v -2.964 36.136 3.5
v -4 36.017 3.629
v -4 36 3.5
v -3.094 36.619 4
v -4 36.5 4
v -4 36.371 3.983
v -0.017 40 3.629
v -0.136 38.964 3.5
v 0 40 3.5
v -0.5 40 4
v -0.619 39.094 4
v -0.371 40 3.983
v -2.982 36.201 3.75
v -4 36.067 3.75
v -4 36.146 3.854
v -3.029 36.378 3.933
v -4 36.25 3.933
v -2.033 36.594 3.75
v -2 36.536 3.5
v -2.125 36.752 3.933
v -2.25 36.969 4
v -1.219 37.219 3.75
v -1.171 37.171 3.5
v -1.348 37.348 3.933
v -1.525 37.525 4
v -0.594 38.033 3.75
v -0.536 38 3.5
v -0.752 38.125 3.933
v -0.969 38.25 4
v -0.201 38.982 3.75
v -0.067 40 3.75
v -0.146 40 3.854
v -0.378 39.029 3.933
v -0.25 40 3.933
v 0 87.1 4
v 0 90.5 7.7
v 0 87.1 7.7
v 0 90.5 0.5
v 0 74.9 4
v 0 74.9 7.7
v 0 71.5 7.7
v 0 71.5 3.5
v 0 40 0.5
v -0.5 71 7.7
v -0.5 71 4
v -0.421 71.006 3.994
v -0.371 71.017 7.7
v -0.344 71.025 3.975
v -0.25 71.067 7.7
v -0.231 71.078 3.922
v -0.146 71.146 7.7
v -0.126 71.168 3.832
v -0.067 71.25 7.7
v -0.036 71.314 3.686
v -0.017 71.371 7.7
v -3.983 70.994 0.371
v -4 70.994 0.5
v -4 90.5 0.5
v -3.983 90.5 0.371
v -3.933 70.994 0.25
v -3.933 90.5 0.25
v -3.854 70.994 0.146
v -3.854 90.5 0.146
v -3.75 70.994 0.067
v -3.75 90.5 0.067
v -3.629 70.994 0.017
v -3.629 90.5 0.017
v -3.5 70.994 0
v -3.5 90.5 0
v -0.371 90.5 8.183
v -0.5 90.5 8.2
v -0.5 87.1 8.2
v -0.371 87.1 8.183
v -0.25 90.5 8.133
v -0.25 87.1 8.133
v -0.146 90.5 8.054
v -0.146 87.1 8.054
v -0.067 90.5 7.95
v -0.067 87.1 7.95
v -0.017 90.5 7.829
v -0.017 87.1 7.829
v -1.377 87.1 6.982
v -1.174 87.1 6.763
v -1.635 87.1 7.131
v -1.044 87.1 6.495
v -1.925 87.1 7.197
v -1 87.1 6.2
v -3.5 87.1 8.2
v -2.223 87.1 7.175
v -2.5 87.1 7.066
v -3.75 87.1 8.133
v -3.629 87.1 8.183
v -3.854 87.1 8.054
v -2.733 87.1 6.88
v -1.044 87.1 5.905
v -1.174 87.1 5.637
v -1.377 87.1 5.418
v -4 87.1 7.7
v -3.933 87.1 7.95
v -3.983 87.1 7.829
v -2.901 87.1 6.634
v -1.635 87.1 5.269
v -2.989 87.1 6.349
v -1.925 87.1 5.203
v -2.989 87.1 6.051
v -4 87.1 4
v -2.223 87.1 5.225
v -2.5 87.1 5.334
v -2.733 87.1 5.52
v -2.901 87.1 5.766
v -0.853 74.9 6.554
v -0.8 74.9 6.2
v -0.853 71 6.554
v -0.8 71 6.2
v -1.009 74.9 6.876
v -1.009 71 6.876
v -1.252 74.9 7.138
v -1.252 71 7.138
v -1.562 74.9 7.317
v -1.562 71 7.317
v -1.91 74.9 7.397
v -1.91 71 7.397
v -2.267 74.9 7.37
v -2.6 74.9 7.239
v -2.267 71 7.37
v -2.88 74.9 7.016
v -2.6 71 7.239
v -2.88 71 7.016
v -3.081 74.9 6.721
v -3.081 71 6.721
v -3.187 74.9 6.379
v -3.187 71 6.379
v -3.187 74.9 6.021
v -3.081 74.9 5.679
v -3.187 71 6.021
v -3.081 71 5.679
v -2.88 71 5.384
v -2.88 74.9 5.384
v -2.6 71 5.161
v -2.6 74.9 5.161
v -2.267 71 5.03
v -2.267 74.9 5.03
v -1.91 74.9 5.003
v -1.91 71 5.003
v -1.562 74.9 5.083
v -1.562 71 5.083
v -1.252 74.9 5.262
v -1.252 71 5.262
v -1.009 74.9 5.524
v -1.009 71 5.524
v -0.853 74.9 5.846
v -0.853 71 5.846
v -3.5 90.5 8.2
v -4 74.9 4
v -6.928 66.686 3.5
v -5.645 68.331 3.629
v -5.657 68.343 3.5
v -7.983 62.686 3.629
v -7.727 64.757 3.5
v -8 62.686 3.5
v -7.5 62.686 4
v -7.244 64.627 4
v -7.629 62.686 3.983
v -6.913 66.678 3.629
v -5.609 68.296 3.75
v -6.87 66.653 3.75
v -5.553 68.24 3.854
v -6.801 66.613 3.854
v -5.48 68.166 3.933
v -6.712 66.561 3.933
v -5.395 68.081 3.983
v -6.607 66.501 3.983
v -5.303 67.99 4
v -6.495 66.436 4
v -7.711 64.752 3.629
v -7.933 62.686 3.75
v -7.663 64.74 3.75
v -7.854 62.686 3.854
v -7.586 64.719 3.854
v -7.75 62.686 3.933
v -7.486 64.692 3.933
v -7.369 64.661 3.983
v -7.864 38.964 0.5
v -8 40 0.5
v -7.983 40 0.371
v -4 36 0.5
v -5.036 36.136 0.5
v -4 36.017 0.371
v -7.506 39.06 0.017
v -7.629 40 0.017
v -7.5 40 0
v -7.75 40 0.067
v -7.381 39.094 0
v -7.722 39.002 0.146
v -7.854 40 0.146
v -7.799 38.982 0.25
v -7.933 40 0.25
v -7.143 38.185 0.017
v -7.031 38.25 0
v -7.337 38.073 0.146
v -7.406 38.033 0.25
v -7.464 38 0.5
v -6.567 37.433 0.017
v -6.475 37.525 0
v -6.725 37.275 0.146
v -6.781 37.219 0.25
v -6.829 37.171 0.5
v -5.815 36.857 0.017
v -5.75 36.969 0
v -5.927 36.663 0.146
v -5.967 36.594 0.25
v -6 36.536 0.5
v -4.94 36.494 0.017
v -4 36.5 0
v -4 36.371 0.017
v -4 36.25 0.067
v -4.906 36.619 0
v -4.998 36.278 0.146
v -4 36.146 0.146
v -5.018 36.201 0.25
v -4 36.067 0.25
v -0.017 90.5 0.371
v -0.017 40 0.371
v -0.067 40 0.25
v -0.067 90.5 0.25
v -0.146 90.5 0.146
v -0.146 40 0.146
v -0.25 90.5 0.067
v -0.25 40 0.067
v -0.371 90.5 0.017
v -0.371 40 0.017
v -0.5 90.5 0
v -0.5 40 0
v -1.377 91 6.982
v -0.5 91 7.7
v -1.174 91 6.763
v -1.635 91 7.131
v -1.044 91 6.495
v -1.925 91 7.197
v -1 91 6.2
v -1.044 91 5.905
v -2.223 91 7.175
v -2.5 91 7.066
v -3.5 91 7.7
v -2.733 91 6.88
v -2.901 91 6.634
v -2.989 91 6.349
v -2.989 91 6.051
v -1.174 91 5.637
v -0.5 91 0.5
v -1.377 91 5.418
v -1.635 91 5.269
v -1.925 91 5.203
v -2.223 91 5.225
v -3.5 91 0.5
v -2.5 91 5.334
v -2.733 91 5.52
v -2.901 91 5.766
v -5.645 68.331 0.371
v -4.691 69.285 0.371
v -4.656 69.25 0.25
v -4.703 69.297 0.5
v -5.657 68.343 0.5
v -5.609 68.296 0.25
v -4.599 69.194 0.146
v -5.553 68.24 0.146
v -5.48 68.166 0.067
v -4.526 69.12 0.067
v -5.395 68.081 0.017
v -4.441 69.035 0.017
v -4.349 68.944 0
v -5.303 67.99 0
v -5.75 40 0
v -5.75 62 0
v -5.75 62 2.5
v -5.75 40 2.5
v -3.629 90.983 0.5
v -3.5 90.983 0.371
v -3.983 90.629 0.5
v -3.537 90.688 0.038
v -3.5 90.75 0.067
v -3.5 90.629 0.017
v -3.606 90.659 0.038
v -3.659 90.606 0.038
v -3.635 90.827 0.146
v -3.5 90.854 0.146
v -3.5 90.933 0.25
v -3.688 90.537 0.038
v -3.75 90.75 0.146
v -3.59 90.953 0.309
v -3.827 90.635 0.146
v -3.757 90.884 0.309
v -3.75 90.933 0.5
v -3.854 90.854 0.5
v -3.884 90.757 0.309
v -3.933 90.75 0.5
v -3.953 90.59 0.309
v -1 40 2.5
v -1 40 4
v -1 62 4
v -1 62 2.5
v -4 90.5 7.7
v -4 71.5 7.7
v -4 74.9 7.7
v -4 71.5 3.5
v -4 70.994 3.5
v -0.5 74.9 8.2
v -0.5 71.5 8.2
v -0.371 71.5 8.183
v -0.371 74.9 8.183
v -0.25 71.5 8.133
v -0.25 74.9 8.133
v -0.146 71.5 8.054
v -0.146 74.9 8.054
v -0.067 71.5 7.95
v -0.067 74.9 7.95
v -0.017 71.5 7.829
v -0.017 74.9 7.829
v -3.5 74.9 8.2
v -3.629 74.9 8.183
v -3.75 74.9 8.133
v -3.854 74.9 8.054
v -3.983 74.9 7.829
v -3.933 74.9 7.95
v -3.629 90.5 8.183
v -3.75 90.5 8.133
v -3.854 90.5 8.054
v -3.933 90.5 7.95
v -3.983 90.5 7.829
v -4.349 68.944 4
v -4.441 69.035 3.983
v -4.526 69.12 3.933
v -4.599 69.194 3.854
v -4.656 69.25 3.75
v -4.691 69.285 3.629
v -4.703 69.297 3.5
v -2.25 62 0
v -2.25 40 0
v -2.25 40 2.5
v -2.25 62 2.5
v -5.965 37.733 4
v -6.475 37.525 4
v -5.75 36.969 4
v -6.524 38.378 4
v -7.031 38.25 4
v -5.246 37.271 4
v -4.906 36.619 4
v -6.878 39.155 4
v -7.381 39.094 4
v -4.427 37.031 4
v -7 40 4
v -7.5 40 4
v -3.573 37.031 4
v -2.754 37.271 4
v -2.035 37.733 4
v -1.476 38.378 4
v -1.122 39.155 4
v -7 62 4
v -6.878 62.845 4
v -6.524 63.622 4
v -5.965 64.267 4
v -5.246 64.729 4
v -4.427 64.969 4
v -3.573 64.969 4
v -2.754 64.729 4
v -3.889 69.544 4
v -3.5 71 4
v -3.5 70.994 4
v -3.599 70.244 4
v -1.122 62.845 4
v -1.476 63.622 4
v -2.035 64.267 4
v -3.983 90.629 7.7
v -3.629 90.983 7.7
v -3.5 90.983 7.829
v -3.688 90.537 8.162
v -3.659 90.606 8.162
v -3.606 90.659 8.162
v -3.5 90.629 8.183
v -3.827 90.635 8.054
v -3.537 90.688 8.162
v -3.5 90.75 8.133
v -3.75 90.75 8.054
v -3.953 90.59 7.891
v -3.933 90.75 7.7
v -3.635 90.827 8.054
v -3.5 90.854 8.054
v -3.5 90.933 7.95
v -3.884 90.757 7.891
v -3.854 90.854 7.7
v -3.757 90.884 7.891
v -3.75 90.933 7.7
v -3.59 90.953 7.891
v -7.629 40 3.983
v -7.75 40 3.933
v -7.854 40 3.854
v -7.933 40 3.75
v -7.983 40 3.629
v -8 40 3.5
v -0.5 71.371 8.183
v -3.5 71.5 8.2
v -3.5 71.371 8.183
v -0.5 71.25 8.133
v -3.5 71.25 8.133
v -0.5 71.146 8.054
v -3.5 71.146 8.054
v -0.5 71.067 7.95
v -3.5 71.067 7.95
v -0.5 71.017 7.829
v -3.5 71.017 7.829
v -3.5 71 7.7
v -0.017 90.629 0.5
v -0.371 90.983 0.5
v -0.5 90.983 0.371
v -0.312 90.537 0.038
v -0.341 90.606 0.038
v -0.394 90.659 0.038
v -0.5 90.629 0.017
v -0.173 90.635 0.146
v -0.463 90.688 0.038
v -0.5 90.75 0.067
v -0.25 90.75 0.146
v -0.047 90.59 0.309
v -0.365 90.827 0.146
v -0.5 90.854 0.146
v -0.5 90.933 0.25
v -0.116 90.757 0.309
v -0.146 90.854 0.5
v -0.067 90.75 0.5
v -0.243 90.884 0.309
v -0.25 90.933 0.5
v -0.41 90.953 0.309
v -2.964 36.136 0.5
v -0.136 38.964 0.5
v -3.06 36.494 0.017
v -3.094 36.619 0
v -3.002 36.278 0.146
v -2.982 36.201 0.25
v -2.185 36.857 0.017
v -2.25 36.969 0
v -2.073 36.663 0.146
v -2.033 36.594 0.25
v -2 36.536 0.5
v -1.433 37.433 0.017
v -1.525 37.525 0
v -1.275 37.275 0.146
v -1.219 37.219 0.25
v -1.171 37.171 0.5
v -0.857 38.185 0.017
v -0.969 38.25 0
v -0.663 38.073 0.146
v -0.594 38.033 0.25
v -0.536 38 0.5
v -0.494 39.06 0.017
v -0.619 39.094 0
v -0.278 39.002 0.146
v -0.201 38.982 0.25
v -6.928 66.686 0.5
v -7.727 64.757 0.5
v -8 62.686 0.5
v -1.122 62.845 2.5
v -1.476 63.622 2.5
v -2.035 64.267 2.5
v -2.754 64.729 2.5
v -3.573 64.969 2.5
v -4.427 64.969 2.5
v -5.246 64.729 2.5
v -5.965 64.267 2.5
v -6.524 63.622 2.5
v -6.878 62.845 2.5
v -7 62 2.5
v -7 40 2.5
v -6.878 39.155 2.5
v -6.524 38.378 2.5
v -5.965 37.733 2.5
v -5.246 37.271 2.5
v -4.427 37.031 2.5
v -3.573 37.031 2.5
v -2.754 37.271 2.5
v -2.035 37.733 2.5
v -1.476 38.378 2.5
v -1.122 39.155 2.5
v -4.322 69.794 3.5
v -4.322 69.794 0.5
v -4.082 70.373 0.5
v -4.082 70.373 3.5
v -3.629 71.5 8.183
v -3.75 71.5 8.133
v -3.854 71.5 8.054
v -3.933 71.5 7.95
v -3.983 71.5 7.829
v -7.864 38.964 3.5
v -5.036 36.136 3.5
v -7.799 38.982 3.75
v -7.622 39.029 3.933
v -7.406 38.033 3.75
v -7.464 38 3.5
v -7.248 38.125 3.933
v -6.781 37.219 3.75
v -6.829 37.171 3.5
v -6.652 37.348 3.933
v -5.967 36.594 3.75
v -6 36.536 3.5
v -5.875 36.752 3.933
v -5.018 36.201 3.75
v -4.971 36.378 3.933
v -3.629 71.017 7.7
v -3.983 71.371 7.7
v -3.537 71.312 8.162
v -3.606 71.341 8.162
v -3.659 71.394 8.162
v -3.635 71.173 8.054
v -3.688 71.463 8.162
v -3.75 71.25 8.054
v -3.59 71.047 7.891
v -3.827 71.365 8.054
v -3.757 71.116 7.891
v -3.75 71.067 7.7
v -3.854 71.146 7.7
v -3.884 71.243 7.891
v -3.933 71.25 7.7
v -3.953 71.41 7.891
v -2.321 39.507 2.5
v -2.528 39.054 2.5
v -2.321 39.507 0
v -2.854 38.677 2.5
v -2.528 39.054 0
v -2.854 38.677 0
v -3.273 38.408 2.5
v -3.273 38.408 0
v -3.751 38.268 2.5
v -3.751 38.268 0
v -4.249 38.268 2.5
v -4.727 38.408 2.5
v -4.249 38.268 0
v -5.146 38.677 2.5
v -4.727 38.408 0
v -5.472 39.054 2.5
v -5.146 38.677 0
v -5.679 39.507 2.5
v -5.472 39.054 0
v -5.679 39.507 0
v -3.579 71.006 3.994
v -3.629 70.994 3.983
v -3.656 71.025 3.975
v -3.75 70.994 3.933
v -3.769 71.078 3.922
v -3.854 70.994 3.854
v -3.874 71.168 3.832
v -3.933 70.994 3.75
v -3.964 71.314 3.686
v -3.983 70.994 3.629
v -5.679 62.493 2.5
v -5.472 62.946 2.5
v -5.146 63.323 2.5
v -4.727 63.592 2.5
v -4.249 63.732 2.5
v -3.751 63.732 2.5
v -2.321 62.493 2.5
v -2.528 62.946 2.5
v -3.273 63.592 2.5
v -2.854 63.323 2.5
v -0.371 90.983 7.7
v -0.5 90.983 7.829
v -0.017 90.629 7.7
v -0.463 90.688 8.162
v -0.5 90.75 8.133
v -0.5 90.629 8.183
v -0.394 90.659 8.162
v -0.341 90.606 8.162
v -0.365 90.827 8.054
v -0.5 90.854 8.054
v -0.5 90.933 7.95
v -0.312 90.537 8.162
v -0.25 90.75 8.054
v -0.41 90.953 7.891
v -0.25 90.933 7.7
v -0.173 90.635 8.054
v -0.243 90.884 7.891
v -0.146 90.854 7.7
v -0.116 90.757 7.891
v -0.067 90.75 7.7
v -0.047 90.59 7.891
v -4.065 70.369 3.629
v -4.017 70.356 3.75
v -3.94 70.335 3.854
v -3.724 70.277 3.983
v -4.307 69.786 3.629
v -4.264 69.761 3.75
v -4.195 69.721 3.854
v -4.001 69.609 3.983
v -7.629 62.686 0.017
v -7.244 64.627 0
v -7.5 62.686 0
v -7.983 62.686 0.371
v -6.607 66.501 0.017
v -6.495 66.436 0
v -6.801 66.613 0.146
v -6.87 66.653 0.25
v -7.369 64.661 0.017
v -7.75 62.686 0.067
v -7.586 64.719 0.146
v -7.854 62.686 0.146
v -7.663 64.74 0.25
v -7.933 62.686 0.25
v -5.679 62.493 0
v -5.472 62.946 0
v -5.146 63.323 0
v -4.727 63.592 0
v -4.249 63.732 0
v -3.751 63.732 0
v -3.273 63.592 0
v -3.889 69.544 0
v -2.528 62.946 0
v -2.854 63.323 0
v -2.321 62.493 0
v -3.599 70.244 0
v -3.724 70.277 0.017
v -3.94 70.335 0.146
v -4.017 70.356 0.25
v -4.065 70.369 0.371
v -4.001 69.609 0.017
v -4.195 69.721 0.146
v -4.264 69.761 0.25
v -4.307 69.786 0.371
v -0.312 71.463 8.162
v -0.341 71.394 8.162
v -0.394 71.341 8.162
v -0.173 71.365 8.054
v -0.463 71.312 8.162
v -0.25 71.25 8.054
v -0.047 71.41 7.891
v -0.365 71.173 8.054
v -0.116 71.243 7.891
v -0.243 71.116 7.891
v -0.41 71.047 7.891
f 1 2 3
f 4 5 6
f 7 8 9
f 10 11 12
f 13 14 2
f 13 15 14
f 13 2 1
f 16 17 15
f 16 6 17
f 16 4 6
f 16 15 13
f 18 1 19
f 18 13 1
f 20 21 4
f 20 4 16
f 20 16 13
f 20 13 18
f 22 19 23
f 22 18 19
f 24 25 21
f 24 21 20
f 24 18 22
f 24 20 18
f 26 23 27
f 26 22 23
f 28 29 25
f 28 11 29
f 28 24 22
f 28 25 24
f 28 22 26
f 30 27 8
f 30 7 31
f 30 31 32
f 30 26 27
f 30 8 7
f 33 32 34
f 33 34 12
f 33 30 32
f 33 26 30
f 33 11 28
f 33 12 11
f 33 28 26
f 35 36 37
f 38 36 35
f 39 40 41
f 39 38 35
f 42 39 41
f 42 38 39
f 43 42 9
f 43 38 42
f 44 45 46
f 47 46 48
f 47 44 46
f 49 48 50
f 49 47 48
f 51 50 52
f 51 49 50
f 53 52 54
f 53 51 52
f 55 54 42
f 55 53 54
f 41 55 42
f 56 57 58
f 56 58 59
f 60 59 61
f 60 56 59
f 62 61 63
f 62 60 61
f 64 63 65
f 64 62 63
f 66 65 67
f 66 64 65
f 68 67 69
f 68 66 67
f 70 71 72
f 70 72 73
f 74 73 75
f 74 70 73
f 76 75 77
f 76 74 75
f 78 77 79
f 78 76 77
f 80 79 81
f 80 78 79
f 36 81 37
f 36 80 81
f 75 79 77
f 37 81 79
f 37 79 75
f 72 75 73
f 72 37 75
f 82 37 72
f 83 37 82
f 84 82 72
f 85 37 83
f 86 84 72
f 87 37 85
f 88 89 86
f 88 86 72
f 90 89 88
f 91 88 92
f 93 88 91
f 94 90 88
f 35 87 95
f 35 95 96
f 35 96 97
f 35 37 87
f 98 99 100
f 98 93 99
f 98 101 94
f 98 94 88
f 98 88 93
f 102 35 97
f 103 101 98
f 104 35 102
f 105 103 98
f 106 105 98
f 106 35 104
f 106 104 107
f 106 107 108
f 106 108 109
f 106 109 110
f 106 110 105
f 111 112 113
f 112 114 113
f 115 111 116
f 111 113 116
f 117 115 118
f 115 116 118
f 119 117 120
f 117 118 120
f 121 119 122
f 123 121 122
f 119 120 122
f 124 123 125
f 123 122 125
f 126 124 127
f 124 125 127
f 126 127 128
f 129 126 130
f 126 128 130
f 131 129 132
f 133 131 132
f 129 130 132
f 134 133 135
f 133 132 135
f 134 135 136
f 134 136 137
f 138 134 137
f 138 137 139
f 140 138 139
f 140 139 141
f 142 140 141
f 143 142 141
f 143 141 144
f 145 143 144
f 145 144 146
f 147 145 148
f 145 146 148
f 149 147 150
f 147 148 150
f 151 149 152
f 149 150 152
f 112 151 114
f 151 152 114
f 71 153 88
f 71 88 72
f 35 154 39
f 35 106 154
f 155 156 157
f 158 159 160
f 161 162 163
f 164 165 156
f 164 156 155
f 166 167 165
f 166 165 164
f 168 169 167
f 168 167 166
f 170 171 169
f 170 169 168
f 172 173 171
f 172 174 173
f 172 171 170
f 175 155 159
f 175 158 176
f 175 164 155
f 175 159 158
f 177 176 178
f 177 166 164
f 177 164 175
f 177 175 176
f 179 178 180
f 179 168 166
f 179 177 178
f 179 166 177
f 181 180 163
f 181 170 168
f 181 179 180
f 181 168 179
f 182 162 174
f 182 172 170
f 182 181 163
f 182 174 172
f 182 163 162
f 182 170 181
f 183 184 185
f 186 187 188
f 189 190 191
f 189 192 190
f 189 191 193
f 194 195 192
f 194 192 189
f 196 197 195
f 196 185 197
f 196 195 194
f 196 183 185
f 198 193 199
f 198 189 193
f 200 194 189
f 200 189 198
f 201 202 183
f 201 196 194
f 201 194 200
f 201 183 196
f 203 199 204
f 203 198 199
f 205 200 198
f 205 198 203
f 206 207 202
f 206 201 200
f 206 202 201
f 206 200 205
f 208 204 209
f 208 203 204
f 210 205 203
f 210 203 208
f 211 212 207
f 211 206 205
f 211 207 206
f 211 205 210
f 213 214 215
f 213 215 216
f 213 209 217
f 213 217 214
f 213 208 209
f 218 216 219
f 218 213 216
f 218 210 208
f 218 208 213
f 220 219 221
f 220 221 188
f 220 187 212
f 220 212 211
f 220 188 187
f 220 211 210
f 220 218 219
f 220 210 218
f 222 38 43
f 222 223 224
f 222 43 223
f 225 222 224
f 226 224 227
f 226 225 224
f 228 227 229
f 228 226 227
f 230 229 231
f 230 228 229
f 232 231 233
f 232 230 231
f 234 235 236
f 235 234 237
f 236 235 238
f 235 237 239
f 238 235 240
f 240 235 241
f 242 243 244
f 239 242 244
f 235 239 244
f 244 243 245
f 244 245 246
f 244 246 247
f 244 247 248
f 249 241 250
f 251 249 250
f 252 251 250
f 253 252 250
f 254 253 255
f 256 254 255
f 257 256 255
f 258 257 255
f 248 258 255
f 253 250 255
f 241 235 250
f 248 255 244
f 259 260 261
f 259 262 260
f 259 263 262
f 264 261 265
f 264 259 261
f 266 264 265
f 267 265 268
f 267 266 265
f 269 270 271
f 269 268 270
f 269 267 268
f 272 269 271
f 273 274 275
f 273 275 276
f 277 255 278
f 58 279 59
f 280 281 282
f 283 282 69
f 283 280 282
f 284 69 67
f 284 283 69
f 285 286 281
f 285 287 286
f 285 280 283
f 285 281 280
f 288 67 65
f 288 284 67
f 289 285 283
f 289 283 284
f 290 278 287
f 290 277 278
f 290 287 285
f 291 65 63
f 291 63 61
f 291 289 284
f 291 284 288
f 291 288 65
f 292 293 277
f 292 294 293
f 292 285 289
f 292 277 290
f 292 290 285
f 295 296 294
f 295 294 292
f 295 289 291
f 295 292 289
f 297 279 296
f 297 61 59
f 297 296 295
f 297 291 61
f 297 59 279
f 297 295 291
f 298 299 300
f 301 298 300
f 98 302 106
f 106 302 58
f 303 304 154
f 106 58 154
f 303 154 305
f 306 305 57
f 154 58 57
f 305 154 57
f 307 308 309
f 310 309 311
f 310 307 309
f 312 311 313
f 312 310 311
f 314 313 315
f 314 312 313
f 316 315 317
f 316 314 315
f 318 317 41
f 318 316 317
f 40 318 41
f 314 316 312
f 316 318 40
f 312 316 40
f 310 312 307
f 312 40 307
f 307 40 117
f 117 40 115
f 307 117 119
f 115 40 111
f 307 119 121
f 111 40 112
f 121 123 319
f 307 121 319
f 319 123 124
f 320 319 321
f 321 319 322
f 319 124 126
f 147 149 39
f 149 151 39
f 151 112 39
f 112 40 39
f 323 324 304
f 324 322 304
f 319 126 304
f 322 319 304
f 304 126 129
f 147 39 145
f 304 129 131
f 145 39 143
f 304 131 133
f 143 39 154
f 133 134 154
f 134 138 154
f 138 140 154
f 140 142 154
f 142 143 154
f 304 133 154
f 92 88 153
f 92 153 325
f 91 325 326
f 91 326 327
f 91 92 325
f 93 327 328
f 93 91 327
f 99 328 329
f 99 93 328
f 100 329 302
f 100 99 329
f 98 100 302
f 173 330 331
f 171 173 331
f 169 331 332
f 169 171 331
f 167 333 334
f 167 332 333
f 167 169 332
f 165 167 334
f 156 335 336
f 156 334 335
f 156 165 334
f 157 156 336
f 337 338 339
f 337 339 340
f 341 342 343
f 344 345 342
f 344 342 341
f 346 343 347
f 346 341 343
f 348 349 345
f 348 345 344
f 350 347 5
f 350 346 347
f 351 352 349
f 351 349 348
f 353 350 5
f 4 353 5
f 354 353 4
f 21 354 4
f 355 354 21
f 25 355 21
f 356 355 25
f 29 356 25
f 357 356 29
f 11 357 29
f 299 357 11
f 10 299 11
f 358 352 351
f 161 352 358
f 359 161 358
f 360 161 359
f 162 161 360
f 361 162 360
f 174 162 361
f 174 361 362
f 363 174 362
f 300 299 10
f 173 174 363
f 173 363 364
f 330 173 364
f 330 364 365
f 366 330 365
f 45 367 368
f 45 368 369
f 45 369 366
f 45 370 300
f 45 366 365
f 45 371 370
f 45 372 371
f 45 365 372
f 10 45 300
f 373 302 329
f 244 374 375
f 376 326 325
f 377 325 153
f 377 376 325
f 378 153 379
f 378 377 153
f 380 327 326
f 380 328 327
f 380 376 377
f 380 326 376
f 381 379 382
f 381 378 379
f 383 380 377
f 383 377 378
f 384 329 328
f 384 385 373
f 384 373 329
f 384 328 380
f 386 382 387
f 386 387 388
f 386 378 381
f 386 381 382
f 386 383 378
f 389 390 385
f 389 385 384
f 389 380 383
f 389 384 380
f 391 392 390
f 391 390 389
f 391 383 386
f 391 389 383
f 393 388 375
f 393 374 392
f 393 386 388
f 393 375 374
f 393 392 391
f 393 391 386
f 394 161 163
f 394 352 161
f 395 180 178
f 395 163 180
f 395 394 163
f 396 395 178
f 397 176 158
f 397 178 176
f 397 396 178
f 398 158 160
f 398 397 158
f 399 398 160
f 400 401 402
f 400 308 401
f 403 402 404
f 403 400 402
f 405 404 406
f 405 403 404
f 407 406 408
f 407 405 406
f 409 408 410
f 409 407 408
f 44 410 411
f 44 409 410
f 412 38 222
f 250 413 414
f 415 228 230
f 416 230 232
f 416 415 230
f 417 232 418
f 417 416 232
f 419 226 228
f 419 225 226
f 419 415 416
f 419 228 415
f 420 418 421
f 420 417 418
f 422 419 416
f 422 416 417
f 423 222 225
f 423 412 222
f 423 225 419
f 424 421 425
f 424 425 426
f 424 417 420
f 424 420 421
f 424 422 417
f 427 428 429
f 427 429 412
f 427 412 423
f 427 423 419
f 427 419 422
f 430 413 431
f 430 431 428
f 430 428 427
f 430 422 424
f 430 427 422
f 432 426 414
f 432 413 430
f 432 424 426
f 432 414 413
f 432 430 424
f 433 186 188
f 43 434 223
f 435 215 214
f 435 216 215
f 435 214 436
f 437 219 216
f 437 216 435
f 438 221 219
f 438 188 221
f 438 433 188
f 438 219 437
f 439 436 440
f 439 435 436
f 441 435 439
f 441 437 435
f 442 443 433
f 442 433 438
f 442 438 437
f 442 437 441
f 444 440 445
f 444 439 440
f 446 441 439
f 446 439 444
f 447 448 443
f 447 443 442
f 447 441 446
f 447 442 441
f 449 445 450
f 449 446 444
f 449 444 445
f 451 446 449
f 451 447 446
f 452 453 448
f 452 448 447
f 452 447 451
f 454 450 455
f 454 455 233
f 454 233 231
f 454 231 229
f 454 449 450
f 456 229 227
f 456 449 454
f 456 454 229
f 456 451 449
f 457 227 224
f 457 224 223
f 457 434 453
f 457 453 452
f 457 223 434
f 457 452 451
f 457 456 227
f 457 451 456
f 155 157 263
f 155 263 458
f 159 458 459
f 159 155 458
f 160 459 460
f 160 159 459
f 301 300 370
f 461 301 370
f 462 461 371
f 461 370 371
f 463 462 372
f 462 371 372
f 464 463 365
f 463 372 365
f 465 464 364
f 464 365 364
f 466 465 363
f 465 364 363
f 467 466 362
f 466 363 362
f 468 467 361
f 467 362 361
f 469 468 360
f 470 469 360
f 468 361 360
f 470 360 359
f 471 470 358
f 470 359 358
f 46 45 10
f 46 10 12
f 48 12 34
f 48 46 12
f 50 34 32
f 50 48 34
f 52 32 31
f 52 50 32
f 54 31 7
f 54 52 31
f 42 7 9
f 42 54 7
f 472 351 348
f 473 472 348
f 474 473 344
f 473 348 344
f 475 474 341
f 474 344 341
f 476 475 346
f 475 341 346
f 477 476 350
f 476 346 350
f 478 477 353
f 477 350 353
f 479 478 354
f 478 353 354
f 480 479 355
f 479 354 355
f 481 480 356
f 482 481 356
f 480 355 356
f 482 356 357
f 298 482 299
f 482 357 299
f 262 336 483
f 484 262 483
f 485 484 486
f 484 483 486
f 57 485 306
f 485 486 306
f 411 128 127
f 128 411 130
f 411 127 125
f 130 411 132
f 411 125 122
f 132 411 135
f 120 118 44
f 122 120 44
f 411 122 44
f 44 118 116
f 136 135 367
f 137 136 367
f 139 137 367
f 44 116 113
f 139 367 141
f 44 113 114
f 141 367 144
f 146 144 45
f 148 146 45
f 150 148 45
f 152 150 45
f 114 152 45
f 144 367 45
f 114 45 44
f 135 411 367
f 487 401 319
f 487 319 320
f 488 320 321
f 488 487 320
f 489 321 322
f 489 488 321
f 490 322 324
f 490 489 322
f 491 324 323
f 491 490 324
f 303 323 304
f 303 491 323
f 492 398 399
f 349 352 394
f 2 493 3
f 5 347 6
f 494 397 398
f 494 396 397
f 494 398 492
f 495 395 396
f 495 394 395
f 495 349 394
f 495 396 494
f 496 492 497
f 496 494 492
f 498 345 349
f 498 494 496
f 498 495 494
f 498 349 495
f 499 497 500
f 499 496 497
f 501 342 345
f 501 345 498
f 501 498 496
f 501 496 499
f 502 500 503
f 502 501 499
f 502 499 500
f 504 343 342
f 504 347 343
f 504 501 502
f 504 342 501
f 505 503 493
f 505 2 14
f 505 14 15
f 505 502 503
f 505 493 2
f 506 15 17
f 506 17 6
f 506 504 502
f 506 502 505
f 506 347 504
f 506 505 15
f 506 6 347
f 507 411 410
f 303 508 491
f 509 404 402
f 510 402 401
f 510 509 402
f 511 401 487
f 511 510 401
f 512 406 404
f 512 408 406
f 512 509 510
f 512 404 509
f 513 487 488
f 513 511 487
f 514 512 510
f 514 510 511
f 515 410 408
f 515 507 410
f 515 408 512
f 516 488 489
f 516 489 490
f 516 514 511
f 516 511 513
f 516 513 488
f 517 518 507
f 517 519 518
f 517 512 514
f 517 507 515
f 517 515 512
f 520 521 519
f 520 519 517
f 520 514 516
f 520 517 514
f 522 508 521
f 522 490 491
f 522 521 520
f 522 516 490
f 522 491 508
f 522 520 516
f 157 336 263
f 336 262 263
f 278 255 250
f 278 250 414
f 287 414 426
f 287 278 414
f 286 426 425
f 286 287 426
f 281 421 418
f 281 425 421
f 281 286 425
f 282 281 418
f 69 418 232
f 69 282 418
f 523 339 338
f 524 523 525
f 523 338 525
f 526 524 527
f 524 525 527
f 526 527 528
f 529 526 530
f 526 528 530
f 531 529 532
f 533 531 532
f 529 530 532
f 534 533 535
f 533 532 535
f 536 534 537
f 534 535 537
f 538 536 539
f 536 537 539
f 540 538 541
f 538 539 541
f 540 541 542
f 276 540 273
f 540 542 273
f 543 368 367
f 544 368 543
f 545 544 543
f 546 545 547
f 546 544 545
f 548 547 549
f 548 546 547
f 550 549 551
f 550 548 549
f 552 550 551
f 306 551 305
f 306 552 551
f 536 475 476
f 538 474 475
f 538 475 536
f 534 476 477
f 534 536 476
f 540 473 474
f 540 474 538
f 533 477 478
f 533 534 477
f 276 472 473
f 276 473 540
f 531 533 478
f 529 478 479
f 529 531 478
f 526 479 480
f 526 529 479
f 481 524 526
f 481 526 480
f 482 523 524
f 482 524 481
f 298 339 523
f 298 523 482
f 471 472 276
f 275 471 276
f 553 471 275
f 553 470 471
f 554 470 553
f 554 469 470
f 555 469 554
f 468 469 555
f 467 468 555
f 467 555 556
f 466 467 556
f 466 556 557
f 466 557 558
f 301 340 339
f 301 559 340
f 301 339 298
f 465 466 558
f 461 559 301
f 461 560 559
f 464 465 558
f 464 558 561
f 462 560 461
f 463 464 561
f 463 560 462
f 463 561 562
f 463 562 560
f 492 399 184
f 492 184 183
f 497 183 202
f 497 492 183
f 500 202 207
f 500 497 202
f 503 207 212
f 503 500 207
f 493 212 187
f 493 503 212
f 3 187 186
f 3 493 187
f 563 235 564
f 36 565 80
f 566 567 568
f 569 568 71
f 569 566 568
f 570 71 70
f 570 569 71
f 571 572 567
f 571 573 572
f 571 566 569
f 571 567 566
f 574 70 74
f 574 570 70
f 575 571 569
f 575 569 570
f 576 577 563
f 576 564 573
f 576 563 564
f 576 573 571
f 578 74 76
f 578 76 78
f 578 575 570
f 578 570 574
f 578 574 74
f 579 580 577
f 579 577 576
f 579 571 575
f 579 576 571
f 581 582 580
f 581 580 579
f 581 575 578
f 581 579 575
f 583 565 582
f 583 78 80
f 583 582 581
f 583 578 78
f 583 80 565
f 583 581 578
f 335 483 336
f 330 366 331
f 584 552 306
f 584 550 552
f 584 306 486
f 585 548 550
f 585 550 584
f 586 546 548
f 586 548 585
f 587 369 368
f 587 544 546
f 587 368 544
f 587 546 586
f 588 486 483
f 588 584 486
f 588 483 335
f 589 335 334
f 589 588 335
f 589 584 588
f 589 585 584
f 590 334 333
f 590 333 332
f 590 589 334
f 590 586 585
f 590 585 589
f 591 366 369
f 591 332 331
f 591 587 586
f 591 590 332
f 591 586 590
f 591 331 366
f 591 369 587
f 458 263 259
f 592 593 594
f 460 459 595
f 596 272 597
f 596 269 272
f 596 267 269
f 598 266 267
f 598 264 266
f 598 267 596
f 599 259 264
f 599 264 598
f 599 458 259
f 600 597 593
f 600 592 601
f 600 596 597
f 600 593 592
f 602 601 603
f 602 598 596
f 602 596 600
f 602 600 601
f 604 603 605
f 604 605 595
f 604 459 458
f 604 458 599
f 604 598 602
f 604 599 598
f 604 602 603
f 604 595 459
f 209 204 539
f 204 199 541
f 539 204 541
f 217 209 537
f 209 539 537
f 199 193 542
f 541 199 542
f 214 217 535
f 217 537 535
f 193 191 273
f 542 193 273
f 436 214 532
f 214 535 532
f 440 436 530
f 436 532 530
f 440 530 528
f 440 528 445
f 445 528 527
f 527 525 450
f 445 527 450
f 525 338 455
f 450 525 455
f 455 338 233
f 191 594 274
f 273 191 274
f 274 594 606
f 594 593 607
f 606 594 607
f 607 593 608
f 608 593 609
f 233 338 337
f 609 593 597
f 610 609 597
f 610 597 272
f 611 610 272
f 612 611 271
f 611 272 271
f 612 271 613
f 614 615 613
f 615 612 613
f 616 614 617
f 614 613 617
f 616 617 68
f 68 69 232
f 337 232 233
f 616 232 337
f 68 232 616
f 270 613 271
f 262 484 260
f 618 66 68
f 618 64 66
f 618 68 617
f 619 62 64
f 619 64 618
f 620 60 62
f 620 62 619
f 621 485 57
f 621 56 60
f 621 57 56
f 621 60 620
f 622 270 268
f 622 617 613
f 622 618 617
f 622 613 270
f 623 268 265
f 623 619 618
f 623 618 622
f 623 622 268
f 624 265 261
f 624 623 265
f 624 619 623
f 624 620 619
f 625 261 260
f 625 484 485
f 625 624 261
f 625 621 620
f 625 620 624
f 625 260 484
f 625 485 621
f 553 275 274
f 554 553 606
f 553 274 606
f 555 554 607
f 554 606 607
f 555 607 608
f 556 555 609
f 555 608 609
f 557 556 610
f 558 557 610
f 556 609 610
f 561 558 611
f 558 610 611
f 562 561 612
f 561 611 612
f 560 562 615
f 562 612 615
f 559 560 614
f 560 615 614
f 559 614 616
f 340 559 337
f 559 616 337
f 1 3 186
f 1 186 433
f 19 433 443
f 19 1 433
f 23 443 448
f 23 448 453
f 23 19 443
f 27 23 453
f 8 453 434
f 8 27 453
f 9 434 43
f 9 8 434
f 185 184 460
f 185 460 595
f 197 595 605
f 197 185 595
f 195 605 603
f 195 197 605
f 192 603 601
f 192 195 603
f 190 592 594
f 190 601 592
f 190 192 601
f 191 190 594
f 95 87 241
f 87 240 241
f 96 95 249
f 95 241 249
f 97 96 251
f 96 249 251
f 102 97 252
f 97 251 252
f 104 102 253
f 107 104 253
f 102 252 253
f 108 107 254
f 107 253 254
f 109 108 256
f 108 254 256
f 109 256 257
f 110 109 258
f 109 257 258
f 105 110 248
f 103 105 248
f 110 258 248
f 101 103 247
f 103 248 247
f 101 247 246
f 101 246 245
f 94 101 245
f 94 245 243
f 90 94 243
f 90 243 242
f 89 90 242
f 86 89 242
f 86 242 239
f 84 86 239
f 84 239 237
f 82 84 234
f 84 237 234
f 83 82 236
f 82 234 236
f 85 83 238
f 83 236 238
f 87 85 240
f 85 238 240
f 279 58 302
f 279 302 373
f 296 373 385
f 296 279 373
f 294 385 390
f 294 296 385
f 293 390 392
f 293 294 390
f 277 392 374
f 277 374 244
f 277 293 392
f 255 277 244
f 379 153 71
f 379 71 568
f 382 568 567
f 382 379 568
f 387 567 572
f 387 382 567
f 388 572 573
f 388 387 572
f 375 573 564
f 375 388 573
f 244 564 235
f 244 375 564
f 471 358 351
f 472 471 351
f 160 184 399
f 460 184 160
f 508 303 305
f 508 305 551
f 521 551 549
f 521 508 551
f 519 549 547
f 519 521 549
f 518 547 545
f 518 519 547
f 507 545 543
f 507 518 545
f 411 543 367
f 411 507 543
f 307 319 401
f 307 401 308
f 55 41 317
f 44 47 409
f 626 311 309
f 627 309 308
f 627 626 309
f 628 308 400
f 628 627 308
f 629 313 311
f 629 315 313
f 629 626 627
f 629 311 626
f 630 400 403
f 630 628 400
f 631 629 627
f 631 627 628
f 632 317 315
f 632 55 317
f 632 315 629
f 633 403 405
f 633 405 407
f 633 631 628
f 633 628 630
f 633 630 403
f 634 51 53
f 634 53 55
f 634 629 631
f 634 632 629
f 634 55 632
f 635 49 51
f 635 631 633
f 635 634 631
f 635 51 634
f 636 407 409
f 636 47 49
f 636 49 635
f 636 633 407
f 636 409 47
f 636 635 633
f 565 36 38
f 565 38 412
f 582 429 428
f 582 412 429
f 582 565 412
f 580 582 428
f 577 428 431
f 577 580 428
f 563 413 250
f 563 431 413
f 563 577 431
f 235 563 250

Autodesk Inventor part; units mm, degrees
ref_plane "YZ Plane" through (0, 0, 0) normal (1, 0, 0) x (0, 1, 0)
ref_plane "XZ Plane" through (0, 0, 0) normal (0, 1, 0) x (-1, 0, 0)
ref_plane "Work Plane1" through (0, 0, 0) normal (0, 0, 1) x (1, 0, 0)
sketch "Sketch1" plane through (0, 0, 0) normal (0, 0, 1) x (1, 0, 0)
  circle A0 centre (-4, 62) radius 1.75 projected
  circle A1 centre (-4, 50) radius 1.75 projected
  line L0 (-8, 12) -> (-8, 66) projected
  line L1 (0, 66) -> (-8, 66) projected
  line L2 (0, 66) -> (0, 36)
  line L3 (0, 36) -> (-8, 36)
  line L4 (0, 66) -> (0, 91)
  line L5 (0, 91) -> (-4, 91)
  line L6 (-4, 91) -> (-4, 70)
  line L7 (-4, 70) -> (-8, 66)
  line L8 (-8, 66) -> (-8, 36)
  line L9 (-4, 62) -> (-4, 40) construction
  line L10 (-5.75, 62) -> (-5.75, 40)
  line L11 (-2.25, 40) -> (-2.25, 62)
  arc A2 (-2.25, 62) -> (-5.75, 62) centre (-4, 62) ccw
  arc A3 (-5.75, 40) -> (-2.25, 40) centre (-4, 40) ccw
  line L12 (-4, 80.5) -> (0, 80.5) construction
  point P0 (0, 0)
  point P1 (-4, 51)
  point P2 (-2.25, 62)
  dimension "d4" = 21
  dimension "d6" = 4
  dimension "d7" = 135
  dimension "d8" = 30
  dimension "d11" = 4
  dimension "d12" = 22
  dimension "d13" = 1.75
extrude "Extrusion1" add sketch "Sketch1" along normal blind 4
sketch "Sketch2" plane through (0, 0, 4) normal (0, 0, 1) x (1, 0, 0)
  arc A0 (-2.25, 62) -> (-5.75, 62) centre (-4, 62) ccw projected
  arc A1 (-5.75, 40) -> (-2.25, 40) centre (-4, 40) ccw projected
  line L0 (-4, 62) -> (-4, 40) construction
  line L1 (-7, 62) -> (-7, 40)
  line L2 (-1, 40) -> (-1, 62)
  arc A2 (-1, 62) -> (-7, 62) centre (-4, 62) ccw
  arc A3 (-7, 40) -> (-1, 40) centre (-4, 40) ccw
  point P0 (0, 0)
  point P1 (-4, 51)
  dimension "d16" = 6
extrude "Extrusion2" cut sketch "Sketch2" against normal blind 1.5
sketch "Sketch3" plane through (0, 0, 4) normal (0, 0, 1) x (1, 0, 0)
  line L0 (0, 36) -> (0, 91) projected
  line L1 (0, 87.1) -> (-4, 87.1)
  line L2 (-4, 91) -> (-4, 70) projected
  line L3 (-4, 71) -> (0, 71)
  line L4 (0, 74.9) -> (-4, 74.9)
  line L5 (0, 91) -> (-4, 91) projected
  point P0 (0, 0)
  point P1 (0, 70)
  dimension "d19" = 3.9
  dimension "d20" = 3.9
  dimension "d30" = 1
extrude "Extrusion3" add sketch "Sketch3" along normal blind 4.2 contours L3 L2 L4 L0 | L1 L2 L5 L0
sketch "Sketch4" plane through (-4, 91, 0) normal (0, 1, 0) x (1, 0, 0)
  circle A0 centre (2, -6.2) radius 1
  line L0 (4, -8.2) -> (0, -8.2) projected
  point P0 (4, 0)
  point P1 (2, -8.2)
  dimension "d23" = 2
  dimension "d24" = 2
extrude "Extrusion4" cut sketch "Sketch4" against normal up to surface (3.9 mm away)
sketch "Sketch5" plane through (-4, 71, 4) normal (0, -1, 0) x (1, 0, 0)
  circle A0 centre (2, 2.2) radius 1 projected
  circle A1 centre (2, 2.2) radius 1.2
  point P0 (4, -4)
  dimension "d27" = 2.4
extrude "Extrusion5" cut sketch "Sketch5" against normal up to surface (3.9 mm away) contours A0 | A1
fillet "Fillet1" radius 2.4 1 edges at (-4, 70, 2)
fillet "Fillet2" radius 4 2 edges at (-8, 36, 2) (0, 36, 2)
fillet "Fillet3" radius 8 1 edges at (-8, 66, 2)
fillet "Fillet4" radius 0.5 25 edges at (0, 91, 4.1) (-4, 91, 4.1) (-2, 91, 0) (-6.8286, 37.1714, 0) (-8, 51.3429, 0) (-7.391, 65.7478, 0) (-5.1799, 68.8201, 0) (-4.1827, 70.0757, 0) (-4, 80.9971, 0) (0, 65.4998, 0) (-4, 89.05, 8.2) (-2, 91, 8.2) (0, 89.05, 8.2) (-4, 71, 6.1) (0, 71, 6.1) (-2, 71, 8.2) (-4, 72.95, 8.2) (0, 72.95, 8.2) (-5.1799, 68.8201, 4) (-4.1827, 70.0757, 4) (-4, 70.9971, 4) (-8, 51.3429, 4) (-6.8286, 37.1714, 4) (0, 55.4998, 4) (-7.391, 65.7478, 4)
sketch "Sketch6" plane through (0, 0, 4) normal (0, 0, 1) x (1, 0, 0)
  line L0 (-4, 87.1) -> (-4, 74.9) projected
  line L1 (-4, 81) -> (0, 81) construction
  arc A0 (-2.25, 62) -> (-5.75, 62) centre (-4, 62) ccw projected
  line L2 (-4, 62) -> (-4, 61)
  point P0 (0, 0)
  dimension "d35" = 1
  dimension "d36" = 20
properties part number "wiperholder"
